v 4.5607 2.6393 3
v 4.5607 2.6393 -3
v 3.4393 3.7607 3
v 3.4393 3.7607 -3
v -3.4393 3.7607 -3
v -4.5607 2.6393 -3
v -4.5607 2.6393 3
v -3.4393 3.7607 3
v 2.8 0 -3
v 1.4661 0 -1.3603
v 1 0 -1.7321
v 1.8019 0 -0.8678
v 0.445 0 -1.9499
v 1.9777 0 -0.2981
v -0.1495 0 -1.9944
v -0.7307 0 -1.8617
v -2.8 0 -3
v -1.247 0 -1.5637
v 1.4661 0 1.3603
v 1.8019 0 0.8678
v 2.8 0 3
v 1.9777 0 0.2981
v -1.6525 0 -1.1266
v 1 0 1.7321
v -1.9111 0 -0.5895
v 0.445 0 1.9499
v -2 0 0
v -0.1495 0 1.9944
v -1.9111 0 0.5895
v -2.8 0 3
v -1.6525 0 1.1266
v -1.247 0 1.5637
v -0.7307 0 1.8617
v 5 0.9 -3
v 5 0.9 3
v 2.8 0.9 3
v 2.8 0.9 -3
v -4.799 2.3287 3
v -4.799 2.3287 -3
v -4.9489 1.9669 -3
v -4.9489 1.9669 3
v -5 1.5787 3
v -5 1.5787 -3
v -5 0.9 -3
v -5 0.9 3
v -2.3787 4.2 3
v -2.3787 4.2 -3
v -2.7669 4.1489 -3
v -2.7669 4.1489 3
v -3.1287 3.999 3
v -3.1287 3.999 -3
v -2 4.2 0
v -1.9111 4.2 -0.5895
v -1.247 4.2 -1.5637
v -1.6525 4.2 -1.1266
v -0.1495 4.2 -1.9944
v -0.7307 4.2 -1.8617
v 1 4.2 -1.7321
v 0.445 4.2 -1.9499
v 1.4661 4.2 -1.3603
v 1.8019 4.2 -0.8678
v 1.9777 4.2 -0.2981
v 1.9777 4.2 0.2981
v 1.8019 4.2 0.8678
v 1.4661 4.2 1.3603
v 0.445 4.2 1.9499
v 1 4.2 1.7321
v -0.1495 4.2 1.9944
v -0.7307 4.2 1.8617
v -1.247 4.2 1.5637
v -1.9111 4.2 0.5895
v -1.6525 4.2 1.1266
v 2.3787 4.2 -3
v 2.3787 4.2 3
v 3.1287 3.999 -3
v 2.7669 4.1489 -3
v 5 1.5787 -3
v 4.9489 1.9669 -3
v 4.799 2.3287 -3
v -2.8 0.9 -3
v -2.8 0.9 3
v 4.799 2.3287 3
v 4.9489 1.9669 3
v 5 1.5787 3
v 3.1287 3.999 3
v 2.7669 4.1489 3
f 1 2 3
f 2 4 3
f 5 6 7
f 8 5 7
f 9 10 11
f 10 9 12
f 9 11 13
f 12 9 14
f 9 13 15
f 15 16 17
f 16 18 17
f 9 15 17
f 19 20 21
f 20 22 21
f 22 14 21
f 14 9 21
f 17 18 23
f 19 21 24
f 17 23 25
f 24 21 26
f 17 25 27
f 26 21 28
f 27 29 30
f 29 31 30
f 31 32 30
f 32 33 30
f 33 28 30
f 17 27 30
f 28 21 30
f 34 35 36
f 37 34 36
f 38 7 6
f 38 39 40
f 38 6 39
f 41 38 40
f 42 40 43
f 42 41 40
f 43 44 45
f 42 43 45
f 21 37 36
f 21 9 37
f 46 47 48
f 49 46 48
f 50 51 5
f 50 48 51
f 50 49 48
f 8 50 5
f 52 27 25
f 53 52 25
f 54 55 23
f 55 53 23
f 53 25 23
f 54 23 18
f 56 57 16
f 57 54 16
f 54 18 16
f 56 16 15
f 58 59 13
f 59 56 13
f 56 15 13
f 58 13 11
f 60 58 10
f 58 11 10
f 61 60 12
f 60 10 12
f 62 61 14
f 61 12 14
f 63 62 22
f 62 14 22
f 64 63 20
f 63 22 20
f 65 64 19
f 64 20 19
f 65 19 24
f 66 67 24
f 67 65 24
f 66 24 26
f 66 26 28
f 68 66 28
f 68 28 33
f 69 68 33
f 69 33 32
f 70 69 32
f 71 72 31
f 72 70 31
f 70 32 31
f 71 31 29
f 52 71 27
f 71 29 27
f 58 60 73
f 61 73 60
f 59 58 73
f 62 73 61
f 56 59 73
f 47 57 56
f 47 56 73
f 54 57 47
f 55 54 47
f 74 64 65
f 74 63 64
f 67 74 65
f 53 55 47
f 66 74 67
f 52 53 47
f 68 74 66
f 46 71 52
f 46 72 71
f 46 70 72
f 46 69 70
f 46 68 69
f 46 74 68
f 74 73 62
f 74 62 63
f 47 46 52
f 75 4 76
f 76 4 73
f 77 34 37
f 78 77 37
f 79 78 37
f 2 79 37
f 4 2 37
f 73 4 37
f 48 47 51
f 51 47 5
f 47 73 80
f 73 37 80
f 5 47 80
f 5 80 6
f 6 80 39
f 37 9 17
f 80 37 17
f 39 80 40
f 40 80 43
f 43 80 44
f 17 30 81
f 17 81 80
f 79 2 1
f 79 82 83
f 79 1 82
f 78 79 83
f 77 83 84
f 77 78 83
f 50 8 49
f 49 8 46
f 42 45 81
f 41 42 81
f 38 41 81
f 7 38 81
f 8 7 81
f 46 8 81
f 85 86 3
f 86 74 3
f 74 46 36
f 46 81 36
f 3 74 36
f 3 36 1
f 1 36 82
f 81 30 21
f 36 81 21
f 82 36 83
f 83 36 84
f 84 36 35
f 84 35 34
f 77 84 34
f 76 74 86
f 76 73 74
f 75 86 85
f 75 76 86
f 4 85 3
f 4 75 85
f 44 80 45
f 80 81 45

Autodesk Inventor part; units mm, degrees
ref_plane "YZ Plane" through (0, 0, 0) normal (1, 0, 0) x (0, 1, 0)
ref_plane "XZ Plane" through (0, 0, 0) normal (0, 1, 0) x (-1, 0, 0)
ref_plane "XY Plane" through (0, 0, 0) normal (0, 0, 1) x (1, 0, 0)
sketch "Sketch1" plane through (0, 0, 0) normal (0, 1, 0) x (-1, 0, 0)
  line L0 (-5, -3) -> (5, -3)
  line L1 (5, -3) -> (5, 3)
  line L2 (5, 3) -> (-5, 3)
  line L3 (-5, 3) -> (-5, -3)
  line L4 (-5, -3) -> (5, 3) construction
  line L5 (5, -3) -> (-5, 3) construction
  line L6 (2.8, 3) -> (2.8, -3)
  line L7 (-2.8, -3) -> (-2.8, 3)
  line L8 (-2.8, 0) -> (2.8, 0) construction
  circle A0 centre (0, 0) radius 2
  dimension "d0" = 10
  dimension "d1" = 6
  dimension "d5" = 5.6
  dimension "d11" = 4
extrude "Extrusion1" add sketch "Sketch1" along normal blind 4.2
extrude "Extrusion2" cut sketch "Sketch1" along normal blind 0.9 contours L3 L2 L7 L0 | L6 L2 L1 L0
chamfer "Chamfer1" distance 2 angle 45 2 edges at (-5, 4.2, 0) (5, 4.2, 0)
fillet "Fillet1" radius 1.5 4 edges at (-3, 4.2, 0) (3, 4.2, 0) (-5, 2.2, 0) (5, 2.2, 0)
properties part number "M4 T-Slot Nut"
